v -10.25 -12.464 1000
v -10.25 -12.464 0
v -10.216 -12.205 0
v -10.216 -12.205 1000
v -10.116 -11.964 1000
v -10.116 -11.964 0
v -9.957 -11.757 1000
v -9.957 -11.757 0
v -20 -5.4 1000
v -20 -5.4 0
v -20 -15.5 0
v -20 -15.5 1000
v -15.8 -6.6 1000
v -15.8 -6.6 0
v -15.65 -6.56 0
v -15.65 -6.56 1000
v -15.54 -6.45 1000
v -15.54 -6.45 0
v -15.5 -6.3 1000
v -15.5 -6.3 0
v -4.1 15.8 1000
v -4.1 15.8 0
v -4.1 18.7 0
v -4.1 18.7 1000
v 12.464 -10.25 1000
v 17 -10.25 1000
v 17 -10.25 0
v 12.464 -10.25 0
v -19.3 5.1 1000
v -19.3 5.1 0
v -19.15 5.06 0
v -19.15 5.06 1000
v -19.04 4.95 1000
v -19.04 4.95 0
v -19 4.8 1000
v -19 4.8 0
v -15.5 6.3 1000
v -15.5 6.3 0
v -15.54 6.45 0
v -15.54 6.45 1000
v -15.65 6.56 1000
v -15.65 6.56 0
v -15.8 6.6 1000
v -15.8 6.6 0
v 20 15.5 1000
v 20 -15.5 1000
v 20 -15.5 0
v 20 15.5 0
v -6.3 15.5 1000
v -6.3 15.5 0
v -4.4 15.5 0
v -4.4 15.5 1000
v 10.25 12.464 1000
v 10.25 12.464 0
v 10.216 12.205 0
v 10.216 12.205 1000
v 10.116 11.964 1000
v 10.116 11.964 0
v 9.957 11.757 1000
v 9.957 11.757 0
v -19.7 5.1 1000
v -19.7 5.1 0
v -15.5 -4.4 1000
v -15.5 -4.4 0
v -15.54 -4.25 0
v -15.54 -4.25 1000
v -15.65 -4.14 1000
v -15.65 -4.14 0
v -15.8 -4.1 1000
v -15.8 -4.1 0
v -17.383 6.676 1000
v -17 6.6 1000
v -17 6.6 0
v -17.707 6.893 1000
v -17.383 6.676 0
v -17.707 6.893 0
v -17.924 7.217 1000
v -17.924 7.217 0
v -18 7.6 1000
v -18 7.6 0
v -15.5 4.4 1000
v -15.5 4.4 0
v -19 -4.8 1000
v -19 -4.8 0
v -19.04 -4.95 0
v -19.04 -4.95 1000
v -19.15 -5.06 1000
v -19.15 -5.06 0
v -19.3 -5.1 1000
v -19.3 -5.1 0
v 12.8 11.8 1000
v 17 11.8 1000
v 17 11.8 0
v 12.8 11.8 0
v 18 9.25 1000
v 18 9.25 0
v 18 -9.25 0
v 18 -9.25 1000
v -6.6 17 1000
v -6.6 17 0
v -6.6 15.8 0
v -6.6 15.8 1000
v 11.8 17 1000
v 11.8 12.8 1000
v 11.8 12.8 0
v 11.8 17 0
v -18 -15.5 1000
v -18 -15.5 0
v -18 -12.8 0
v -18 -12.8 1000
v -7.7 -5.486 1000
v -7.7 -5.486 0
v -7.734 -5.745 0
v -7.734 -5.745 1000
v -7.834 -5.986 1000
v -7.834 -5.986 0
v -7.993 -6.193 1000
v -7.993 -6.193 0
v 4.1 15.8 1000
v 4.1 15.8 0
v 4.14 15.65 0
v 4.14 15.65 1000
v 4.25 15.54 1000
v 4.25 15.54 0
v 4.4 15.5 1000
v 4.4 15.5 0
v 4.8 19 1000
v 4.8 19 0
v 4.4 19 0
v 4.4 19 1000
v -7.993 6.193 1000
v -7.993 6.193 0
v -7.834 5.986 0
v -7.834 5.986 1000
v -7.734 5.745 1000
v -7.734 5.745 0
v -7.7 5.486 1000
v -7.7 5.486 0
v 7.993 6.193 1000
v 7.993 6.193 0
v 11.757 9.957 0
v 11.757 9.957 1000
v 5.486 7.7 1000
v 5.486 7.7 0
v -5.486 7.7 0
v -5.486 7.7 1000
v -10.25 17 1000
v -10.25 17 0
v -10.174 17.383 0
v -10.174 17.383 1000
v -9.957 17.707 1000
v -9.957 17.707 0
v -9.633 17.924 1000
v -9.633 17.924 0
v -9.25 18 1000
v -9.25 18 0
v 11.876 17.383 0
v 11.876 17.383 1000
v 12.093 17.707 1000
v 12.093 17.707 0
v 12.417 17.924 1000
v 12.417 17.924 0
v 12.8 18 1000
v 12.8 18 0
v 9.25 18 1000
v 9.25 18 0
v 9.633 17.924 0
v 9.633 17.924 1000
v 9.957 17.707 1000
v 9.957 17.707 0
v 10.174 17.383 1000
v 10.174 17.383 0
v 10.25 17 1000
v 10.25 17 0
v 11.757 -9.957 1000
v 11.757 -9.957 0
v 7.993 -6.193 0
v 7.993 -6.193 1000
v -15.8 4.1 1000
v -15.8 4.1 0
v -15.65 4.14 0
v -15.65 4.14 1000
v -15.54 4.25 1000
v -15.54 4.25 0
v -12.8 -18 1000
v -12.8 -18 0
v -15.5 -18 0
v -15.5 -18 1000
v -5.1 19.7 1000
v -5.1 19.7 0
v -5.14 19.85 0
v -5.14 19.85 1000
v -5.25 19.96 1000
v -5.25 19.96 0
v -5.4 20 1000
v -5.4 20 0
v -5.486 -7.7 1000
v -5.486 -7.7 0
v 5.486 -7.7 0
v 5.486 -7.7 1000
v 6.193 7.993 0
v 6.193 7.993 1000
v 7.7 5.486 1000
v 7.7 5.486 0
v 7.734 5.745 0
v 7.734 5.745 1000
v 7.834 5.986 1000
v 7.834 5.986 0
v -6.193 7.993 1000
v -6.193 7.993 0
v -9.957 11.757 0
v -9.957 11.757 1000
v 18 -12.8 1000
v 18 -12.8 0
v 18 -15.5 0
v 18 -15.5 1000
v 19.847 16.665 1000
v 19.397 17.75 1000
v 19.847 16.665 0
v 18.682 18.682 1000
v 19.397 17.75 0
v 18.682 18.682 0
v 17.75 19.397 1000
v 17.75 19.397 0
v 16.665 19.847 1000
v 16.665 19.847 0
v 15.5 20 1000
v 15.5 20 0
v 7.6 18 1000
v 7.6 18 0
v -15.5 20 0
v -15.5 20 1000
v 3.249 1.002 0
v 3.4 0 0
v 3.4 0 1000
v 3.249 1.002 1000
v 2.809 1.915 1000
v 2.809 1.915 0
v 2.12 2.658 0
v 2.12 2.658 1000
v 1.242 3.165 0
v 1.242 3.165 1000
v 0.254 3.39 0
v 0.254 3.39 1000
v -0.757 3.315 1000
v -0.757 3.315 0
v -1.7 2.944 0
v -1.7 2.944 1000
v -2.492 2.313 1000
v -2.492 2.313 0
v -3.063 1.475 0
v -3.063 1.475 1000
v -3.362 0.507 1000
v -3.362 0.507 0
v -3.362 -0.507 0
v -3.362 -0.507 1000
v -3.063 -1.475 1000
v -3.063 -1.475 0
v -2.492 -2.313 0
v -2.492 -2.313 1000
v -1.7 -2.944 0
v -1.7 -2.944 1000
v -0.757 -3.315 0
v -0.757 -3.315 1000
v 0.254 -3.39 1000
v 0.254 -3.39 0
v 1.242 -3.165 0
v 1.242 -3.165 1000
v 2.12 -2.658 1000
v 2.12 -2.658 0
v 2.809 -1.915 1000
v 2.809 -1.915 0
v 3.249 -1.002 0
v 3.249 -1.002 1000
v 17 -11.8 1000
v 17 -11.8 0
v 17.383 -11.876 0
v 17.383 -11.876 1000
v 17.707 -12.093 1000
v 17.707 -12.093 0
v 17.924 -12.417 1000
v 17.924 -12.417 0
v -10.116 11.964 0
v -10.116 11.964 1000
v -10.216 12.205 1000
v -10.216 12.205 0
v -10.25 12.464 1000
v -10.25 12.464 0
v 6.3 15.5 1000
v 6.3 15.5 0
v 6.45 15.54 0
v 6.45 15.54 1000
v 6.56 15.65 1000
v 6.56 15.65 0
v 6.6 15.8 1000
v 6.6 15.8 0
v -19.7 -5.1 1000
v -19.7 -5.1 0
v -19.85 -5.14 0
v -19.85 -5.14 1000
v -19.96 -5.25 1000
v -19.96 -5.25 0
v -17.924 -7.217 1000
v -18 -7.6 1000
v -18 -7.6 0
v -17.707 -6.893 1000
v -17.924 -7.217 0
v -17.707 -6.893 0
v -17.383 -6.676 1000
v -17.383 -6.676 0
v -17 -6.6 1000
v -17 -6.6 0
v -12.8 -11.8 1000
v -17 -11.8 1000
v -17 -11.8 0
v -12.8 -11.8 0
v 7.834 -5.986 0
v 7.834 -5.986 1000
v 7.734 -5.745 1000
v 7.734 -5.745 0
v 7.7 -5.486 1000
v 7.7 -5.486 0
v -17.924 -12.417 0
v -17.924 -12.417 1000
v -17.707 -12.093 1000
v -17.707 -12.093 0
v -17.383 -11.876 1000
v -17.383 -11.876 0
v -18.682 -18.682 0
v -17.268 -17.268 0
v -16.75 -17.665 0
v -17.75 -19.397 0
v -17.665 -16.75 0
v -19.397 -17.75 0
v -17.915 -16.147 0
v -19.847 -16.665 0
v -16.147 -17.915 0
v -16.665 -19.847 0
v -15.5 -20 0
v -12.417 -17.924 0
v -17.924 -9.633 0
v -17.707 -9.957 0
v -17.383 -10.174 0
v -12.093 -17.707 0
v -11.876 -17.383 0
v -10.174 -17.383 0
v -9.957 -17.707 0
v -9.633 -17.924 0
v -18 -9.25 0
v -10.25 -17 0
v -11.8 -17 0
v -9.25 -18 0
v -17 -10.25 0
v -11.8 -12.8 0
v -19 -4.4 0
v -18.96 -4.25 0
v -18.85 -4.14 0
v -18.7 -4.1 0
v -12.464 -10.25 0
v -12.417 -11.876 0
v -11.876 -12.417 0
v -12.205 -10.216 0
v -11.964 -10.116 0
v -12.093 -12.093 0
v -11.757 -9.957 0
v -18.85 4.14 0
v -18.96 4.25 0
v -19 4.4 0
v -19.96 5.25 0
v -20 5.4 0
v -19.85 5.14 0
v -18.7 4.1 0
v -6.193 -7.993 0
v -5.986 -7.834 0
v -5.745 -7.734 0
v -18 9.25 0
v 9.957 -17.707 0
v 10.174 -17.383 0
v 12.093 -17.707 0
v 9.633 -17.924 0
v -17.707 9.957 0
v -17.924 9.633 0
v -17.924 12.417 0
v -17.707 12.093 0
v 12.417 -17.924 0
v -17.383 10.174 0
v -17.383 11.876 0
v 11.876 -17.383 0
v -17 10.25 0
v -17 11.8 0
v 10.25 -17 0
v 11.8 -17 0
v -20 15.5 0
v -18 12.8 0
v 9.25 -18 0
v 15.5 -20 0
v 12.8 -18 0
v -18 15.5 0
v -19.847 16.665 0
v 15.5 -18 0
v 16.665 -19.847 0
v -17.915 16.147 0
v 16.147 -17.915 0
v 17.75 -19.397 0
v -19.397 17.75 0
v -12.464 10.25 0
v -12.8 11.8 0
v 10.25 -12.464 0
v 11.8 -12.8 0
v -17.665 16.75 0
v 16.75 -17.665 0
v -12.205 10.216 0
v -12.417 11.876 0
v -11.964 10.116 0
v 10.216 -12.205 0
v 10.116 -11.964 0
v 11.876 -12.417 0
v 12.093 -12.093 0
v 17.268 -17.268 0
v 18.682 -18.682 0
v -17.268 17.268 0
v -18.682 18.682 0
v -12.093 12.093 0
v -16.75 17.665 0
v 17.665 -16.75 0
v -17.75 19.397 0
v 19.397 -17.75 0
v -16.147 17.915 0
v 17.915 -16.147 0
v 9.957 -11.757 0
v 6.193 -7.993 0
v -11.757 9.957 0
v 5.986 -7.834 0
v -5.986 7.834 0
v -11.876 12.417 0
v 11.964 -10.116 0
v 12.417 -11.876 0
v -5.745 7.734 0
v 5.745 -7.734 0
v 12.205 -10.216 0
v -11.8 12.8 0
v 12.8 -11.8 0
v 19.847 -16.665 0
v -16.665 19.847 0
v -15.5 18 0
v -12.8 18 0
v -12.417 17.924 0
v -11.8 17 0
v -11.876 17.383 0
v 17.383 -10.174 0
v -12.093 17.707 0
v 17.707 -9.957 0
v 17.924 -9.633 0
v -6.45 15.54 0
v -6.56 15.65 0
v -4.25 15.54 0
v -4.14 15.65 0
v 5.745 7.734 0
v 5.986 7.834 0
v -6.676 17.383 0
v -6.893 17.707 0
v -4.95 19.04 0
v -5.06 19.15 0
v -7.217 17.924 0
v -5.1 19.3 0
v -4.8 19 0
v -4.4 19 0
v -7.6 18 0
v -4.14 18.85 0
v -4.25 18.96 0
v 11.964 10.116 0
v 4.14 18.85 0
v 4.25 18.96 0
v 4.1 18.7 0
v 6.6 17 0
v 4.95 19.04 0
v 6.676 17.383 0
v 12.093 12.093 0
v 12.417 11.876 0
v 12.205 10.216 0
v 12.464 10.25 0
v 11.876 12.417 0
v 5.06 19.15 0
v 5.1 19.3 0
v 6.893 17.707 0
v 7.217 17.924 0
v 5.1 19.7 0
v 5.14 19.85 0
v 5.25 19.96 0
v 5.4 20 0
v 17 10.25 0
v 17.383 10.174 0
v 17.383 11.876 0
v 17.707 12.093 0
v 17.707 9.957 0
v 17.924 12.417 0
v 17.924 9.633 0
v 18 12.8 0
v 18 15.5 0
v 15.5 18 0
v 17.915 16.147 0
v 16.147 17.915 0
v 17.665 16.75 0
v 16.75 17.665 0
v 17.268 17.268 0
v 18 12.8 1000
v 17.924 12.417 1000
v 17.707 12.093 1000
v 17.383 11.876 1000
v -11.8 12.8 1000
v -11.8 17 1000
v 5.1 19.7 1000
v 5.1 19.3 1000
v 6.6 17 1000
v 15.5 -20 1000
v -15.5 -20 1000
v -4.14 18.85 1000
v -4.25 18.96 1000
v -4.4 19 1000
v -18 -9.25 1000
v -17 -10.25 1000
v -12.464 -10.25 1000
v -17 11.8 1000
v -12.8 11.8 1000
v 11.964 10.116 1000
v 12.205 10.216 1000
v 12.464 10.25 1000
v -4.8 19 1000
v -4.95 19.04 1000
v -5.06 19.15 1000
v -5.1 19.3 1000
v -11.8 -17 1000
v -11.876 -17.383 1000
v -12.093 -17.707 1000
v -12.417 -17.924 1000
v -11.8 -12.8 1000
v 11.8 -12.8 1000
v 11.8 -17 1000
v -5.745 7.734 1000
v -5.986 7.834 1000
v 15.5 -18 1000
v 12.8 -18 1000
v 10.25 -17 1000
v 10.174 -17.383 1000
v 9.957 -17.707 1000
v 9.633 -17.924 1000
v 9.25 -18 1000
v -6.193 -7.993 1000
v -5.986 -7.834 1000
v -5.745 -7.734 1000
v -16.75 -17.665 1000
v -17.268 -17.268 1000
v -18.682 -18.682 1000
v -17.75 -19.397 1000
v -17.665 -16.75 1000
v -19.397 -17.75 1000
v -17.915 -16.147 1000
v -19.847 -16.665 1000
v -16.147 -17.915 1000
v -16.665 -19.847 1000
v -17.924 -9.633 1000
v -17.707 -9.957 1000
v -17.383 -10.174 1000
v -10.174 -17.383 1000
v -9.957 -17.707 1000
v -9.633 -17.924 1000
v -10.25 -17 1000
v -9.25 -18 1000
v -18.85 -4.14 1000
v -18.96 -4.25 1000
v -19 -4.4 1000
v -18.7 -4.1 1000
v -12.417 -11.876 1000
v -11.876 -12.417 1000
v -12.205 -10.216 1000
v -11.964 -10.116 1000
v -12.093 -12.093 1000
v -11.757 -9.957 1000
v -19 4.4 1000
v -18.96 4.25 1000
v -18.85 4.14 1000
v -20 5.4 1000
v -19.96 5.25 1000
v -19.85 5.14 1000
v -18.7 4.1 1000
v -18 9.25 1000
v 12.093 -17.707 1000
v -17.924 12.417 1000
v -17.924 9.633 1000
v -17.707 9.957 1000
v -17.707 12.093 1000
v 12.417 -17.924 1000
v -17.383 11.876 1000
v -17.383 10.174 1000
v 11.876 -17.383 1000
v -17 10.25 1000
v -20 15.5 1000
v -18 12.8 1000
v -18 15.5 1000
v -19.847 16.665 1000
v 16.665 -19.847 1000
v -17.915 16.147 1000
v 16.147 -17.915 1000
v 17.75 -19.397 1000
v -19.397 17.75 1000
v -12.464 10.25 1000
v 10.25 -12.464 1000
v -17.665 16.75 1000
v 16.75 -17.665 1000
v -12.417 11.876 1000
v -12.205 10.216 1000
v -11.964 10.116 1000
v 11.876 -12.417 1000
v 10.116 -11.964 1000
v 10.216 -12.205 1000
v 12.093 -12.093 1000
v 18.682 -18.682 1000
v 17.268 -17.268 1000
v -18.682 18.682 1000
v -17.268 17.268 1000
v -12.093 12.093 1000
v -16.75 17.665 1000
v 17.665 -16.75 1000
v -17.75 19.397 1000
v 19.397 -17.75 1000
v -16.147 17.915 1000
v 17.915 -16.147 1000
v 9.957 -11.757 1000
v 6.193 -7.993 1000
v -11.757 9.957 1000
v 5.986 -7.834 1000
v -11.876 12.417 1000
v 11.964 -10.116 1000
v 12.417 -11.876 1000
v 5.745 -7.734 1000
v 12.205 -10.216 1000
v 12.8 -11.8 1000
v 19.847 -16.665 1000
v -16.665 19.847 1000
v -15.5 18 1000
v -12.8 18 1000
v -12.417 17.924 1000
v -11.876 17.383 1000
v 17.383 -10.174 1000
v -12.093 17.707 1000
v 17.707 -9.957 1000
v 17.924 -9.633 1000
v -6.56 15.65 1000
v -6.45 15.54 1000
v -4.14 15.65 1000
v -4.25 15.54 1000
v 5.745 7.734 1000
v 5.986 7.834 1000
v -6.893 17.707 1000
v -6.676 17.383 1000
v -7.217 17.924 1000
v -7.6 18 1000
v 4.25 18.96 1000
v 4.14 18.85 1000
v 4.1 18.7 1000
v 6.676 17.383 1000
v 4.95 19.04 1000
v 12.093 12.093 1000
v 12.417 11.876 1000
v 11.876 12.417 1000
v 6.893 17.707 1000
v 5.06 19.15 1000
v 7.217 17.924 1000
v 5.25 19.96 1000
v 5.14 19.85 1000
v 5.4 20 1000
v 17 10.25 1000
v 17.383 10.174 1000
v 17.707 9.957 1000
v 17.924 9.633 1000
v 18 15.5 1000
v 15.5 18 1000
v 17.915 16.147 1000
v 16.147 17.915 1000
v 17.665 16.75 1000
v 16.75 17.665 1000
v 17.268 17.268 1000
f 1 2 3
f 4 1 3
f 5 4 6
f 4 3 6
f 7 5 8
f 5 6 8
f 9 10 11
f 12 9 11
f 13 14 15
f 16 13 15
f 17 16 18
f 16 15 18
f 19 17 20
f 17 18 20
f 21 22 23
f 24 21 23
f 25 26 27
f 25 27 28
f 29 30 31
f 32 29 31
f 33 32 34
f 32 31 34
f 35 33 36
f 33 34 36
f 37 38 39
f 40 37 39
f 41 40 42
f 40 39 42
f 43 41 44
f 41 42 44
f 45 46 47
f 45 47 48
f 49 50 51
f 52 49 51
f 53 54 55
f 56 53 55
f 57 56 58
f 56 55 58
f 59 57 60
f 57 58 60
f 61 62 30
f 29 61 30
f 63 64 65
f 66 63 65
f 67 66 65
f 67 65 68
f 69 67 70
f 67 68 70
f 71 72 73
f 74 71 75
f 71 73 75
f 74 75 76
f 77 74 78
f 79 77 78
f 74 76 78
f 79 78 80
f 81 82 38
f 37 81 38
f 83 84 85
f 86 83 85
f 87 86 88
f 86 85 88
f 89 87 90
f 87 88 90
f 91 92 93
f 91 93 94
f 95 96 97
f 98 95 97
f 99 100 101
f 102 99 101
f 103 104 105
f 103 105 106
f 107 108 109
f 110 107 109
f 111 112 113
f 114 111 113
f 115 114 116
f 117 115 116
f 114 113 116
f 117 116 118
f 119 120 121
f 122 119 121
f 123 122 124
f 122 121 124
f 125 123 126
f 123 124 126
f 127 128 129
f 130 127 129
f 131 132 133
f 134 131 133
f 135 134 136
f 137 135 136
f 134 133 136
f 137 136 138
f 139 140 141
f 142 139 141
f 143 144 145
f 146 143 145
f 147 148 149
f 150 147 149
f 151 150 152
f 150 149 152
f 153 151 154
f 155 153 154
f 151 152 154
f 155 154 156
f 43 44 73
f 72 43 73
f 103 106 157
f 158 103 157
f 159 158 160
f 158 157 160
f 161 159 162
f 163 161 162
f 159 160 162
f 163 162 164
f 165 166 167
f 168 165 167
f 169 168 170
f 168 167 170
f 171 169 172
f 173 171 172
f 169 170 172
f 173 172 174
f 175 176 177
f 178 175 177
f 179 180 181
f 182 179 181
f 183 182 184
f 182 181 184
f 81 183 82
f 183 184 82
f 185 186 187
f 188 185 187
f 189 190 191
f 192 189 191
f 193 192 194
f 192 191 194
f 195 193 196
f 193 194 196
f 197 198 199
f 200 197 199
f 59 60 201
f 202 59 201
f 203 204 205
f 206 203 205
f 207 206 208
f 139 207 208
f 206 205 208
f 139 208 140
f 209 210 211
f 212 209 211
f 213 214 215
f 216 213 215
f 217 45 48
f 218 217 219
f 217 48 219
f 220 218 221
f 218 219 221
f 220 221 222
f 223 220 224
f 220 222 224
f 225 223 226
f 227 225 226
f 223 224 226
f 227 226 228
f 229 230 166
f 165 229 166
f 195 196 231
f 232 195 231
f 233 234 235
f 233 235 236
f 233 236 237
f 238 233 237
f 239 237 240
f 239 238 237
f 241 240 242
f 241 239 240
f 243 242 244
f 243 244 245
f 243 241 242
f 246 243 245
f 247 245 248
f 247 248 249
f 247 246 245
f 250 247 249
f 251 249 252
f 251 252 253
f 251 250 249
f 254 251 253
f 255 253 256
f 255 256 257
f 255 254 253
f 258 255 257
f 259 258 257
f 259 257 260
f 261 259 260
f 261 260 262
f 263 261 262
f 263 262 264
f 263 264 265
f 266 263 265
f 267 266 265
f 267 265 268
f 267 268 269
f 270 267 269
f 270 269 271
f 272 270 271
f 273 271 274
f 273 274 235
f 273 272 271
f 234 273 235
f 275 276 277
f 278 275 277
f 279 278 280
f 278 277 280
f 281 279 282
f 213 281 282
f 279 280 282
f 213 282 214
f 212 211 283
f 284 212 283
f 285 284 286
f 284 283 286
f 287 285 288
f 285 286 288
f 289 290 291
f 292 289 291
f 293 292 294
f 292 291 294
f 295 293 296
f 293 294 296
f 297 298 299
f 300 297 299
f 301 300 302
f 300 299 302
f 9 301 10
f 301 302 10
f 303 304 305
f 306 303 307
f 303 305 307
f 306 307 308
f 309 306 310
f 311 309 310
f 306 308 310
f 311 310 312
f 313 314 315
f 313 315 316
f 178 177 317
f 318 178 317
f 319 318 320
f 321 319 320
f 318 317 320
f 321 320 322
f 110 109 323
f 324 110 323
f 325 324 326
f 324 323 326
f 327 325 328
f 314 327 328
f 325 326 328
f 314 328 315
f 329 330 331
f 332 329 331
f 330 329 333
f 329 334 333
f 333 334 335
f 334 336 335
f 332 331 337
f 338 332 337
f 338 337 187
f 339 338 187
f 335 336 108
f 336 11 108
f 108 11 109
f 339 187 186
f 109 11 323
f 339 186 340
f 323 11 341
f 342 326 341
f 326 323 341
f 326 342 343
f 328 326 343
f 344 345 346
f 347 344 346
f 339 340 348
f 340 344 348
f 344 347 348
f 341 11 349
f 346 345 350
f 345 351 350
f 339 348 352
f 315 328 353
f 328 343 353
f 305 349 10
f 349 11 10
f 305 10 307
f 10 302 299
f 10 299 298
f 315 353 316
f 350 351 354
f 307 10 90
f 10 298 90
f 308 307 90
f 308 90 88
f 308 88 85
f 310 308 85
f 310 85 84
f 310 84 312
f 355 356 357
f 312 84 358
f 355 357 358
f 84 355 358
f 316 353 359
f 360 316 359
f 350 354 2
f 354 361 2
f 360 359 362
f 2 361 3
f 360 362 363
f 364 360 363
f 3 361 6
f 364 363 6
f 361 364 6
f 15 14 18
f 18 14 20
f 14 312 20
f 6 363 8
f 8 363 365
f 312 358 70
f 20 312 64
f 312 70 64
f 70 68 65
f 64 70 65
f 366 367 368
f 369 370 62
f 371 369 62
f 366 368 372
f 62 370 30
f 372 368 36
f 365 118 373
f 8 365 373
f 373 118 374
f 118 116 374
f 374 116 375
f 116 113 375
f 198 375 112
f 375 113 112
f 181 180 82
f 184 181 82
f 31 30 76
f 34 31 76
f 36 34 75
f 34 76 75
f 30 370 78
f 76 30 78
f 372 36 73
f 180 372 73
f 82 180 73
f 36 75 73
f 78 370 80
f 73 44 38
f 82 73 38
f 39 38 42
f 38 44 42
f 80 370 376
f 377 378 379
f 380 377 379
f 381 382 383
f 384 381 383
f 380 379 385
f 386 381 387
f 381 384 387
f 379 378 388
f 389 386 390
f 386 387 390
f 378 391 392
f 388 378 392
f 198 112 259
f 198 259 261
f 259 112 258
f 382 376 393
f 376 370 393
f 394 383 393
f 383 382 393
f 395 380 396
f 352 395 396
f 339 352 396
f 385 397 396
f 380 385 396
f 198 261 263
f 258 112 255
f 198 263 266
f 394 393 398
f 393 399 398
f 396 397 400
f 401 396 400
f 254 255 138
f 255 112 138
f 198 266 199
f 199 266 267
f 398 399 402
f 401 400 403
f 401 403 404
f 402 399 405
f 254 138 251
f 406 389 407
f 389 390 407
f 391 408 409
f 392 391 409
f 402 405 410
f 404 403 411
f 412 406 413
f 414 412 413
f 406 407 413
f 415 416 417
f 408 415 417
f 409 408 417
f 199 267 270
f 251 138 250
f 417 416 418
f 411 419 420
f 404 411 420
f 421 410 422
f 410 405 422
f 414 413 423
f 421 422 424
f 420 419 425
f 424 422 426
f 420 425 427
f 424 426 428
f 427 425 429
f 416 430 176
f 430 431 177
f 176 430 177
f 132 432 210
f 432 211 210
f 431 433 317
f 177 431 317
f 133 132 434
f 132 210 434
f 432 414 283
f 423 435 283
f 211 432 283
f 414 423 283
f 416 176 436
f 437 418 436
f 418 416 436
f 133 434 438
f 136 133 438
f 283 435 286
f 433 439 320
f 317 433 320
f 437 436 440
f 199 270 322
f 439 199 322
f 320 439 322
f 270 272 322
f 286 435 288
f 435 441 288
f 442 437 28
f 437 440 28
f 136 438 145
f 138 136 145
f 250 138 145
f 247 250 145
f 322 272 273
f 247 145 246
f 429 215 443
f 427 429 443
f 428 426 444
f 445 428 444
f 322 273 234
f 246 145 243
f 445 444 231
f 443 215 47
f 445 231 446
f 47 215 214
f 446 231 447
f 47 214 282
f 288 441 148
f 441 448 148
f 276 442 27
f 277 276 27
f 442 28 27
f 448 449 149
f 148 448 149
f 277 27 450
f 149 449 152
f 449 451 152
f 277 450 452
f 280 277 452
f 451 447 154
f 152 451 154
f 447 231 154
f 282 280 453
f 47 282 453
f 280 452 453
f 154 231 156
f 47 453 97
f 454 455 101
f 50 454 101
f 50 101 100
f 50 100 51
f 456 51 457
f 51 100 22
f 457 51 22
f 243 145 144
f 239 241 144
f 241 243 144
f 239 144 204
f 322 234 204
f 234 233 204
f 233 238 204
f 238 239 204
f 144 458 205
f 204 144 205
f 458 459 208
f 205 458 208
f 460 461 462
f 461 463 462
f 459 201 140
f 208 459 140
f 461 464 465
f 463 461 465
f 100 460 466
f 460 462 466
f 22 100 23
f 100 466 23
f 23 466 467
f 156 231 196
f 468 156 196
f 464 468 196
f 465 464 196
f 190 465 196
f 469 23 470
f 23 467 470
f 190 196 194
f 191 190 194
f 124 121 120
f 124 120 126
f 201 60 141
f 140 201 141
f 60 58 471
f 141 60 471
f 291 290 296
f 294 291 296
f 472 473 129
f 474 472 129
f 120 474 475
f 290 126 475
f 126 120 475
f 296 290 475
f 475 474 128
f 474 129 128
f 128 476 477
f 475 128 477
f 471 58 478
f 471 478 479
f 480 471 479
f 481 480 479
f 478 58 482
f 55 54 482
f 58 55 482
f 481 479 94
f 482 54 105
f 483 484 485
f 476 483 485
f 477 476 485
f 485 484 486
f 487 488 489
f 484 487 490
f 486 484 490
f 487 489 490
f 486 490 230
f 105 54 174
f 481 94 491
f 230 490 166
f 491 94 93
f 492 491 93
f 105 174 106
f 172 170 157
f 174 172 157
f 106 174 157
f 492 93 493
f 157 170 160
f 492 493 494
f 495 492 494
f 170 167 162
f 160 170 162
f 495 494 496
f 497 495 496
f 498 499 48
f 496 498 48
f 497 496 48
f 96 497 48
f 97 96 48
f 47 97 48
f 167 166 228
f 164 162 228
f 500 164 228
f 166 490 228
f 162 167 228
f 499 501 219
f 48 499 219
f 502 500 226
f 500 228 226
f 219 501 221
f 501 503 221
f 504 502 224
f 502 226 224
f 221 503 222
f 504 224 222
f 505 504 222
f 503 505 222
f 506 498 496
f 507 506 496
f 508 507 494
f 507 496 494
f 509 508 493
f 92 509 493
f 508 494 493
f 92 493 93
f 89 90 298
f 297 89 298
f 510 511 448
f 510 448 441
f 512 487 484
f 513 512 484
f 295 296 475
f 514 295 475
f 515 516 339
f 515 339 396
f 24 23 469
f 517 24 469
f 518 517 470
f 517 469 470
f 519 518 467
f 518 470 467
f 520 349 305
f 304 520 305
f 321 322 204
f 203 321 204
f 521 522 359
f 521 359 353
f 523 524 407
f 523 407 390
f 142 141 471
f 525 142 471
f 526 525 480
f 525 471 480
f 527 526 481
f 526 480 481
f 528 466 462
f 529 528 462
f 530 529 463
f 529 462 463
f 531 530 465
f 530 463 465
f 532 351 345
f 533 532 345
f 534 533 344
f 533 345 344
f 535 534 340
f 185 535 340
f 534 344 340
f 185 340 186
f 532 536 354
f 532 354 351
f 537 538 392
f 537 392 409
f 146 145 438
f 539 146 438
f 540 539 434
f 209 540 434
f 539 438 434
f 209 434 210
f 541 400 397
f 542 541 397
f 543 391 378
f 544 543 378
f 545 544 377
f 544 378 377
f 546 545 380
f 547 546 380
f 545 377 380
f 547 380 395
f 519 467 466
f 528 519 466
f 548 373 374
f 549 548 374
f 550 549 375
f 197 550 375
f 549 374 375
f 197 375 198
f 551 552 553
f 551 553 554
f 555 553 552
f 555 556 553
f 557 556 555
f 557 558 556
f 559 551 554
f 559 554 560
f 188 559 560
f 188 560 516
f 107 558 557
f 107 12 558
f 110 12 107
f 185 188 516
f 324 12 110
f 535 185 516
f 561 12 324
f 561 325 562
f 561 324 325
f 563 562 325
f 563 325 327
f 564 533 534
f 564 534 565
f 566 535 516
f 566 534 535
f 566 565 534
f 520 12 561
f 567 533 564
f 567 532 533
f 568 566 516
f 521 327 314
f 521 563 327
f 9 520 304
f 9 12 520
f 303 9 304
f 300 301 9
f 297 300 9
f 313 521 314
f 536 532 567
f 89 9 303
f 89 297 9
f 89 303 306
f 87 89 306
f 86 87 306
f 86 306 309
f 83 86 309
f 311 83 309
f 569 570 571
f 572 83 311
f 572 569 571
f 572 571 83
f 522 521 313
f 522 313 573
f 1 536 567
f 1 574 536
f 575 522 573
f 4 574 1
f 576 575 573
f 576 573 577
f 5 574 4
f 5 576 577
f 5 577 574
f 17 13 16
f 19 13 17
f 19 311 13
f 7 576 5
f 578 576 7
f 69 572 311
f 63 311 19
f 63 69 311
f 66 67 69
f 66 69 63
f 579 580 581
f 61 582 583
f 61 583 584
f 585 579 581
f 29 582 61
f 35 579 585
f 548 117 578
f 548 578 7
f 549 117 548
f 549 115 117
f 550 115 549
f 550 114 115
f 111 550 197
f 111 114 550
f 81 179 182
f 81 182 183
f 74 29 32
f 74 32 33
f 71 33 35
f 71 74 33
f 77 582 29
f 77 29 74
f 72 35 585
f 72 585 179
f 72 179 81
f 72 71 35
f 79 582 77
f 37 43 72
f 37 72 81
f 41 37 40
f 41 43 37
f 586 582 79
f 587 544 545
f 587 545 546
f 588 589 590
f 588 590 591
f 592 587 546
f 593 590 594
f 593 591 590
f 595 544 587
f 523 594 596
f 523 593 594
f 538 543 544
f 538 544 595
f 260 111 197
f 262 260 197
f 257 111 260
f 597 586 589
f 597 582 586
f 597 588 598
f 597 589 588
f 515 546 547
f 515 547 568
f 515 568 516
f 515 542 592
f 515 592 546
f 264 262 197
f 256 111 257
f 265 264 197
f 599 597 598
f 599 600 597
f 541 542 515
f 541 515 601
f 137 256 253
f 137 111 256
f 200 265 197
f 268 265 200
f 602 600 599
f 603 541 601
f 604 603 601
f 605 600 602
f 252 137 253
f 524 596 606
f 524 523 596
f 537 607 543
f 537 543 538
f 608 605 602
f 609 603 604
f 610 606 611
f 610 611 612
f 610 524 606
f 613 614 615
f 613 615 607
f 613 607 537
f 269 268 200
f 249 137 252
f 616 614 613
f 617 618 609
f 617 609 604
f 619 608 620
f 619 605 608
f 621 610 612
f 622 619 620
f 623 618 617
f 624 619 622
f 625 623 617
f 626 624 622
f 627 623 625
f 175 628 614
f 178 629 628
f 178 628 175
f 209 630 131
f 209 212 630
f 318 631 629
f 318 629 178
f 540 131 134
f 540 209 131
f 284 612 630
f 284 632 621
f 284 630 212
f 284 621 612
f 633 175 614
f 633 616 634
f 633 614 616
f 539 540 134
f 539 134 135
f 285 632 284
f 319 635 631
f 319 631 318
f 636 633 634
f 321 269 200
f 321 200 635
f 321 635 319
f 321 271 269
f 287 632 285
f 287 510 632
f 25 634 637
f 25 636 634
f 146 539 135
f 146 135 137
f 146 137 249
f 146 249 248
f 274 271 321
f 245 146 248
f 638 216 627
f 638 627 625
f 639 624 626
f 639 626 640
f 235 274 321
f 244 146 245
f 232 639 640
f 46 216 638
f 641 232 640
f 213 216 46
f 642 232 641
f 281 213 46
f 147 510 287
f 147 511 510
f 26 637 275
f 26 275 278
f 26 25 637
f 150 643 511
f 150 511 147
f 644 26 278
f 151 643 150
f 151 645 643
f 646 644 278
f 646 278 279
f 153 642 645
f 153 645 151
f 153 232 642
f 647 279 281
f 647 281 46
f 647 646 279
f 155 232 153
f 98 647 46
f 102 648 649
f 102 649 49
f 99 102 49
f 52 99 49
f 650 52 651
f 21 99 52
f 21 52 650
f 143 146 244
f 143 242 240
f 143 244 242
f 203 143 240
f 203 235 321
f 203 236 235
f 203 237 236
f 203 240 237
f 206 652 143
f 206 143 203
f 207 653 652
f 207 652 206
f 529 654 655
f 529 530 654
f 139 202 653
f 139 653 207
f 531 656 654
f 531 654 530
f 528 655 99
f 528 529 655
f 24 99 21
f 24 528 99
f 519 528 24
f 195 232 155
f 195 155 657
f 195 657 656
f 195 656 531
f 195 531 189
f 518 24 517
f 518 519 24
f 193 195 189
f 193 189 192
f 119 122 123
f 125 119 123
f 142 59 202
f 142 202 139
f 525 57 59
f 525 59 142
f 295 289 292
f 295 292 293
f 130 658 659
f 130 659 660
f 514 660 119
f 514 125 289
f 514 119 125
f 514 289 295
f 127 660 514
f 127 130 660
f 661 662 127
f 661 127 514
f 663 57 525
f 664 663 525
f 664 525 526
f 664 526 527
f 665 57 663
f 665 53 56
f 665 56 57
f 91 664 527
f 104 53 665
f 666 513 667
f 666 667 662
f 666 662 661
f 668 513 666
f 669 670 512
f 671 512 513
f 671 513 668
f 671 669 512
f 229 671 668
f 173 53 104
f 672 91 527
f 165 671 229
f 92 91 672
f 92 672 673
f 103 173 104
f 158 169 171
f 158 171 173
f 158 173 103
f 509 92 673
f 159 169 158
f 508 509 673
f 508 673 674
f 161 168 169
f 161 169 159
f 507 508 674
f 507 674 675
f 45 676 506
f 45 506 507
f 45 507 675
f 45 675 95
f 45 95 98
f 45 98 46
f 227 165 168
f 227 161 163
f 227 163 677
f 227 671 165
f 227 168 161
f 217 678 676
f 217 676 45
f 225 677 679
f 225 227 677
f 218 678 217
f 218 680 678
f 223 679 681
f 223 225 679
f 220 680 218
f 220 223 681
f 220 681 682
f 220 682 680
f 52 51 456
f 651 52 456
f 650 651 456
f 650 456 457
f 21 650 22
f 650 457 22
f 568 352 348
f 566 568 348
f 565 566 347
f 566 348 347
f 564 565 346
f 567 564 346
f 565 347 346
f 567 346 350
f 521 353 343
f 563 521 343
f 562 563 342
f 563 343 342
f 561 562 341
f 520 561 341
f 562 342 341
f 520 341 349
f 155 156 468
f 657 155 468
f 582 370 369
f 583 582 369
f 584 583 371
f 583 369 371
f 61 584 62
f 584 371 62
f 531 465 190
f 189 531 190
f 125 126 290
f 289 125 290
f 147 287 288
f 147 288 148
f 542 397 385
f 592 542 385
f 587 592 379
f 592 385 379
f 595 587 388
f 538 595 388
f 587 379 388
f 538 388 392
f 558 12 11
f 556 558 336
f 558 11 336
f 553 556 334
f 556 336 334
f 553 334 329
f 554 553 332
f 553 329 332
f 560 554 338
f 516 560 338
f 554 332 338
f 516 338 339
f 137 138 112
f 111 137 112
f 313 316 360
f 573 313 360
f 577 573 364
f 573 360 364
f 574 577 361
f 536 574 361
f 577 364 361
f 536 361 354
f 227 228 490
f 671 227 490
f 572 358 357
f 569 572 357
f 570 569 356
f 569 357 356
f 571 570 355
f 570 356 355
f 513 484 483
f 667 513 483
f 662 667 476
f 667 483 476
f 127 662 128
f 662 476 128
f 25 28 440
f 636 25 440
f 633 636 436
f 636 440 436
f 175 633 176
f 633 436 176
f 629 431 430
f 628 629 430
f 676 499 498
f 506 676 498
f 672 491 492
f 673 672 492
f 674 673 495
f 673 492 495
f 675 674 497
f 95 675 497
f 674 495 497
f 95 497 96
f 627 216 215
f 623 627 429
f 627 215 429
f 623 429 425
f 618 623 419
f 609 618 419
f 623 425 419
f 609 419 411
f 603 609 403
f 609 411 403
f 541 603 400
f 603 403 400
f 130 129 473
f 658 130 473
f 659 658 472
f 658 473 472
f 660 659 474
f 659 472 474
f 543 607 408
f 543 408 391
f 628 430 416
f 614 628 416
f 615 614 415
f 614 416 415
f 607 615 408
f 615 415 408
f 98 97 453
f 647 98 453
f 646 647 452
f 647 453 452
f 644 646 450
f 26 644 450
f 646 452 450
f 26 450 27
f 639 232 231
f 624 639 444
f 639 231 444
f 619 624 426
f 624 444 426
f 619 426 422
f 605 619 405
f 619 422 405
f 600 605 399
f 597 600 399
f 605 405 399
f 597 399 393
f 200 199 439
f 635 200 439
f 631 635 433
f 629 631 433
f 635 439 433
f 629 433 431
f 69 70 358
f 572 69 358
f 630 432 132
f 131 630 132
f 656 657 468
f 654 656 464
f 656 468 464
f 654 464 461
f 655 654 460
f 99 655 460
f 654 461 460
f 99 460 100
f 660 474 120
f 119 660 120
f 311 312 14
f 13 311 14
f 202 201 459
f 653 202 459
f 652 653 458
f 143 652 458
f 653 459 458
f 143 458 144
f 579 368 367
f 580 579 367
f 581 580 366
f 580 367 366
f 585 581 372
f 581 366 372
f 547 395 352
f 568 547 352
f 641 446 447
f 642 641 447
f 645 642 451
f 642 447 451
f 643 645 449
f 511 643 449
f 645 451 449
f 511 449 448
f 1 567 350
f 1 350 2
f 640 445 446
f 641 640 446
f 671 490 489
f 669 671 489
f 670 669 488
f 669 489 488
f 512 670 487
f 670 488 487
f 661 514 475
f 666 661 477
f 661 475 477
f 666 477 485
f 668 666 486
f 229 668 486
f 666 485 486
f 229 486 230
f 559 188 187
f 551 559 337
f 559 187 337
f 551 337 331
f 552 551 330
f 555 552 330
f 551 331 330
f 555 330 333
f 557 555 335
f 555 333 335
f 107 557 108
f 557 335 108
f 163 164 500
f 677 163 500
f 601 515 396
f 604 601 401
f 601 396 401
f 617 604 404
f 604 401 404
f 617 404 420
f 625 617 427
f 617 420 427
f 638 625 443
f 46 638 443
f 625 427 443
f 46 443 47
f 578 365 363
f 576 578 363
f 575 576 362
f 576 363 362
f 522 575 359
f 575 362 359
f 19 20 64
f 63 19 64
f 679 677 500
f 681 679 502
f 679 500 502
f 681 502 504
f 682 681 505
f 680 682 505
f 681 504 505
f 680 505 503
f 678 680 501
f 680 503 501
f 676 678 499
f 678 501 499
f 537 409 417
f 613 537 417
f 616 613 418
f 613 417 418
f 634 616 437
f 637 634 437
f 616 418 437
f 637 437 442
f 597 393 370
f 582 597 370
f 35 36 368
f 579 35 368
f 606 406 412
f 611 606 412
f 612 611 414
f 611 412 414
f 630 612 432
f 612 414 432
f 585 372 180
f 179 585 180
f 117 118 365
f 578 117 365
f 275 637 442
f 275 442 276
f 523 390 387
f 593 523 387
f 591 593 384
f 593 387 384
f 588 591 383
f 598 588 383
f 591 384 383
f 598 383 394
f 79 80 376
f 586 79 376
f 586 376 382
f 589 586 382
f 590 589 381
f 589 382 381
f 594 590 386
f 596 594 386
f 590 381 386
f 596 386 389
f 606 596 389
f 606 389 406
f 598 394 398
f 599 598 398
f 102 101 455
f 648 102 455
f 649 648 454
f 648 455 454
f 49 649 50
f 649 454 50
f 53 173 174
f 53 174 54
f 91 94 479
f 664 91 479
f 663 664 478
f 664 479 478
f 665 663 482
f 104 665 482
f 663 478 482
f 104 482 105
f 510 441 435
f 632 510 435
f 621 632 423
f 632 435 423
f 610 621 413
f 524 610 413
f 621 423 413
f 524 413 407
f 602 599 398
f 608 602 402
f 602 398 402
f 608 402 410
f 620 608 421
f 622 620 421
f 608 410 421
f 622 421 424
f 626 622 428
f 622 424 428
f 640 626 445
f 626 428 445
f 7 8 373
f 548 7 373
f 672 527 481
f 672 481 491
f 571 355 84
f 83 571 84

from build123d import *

# Parameters (mm, degrees)
SKETCH_1_R      = 3.4
EXTRUDE_1_DEPTH = 1000


with BuildPart() as part:
    # Эскиз1 → Бобышка-Вытянуть1 (new body)
    with BuildSketch(Plane.XY):
        with BuildLine():
            Line((-20, 15.5), (-20, 10.25))
            Line((-20, 10.25), (-20, 5.4))
            ThreePointArc((-20, 5.4), (-19.912132034, 5.187867966), (-19.7, 5.1))
            Line((-19.7, 5.1), (-19.3, 5.1))
            ThreePointArc((-19.3, 5.1), (-19.087867966, 5.012132034), (-19, 4.8))
            Line((-19, 4.8), (-19, 4.4))
            ThreePointArc((-19, 4.4), (-18.912132034, 4.187867966), (-18.7, 4.1))
            Line((-18.7, 4.1), (-15.8, 4.1))
            ThreePointArc((-15.8, 4.1), (-15.587867966, 4.187867966), (-15.5, 4.4))
            Line((-15.5, 4.4), (-15.5, 6.3))
            ThreePointArc((-15.5, 6.3), (-15.587867966, 6.512132034), (-15.8, 6.6))
            Line((-15.8, 6.6), (-17, 6.6))
            ThreePointArc((-17, 6.6), (-17.707106781, 6.892893219), (-18, 7.6))
            Line((-18, 7.6), (-18, 9.25))
            ThreePointArc((-18, 9.25), (-17.707106781, 9.957106781), (-17, 10.25))
            Line((-17, 10.25), (-12.464213562, 10.25))
            ThreePointArc((-12.464213562, 10.25), (-12.08153013, 10.173879533), (-11.757106781, 9.957106781))
            Line((-11.757106781, 9.957106781), (-7.992893219, 6.192893219))
            ThreePointArc((-7.992893219, 6.192893219), (-7.776120467, 5.86846987), (-7.7, 5.485786438))
            Line((-7.7, 5.485786438), (-7.7, -5.485786438))
            ThreePointArc((-7.7, -5.485786438), (-7.776120467, -5.86846987), (-7.992893219, -6.192893219))
            Line((-7.992893219, -6.192893219), (-11.757106781, -9.957106781))
            ThreePointArc((-11.757106781, -9.957106781), (-12.08153013, -10.173879533), (-12.464213562, -10.25))
            Line((-12.464213562, -10.25), (-17, -10.25))
            ThreePointArc((-17, -10.25), (-17.707106781, -9.957106781), (-18, -9.25))
            Line((-18, -9.25), (-18, -7.6))
            ThreePointArc((-18, -7.6), (-17.707106781, -6.892893219), (-17, -6.6))
            Line((-17, -6.6), (-15.8, -6.6))
            ThreePointArc((-15.8, -6.6), (-15.587867966, -6.512132034), (-15.5, -6.3))
            Line((-15.5, -6.3), (-15.5, -4.4))
            ThreePointArc((-15.5, -4.4), (-15.587867966, -4.187867966), (-15.8, -4.1))
            Line((-15.8, -4.1), (-18.7, -4.1))
            ThreePointArc((-18.7, -4.1), (-18.912132034, -4.187867966), (-19, -4.4))
            Line((-19, -4.4), (-19, -4.8))
            ThreePointArc((-19, -4.8), (-19.087867966, -5.012132034), (-19.3, -5.1))
            Line((-19.3, -5.1), (-19.7, -5.1))
            ThreePointArc((-19.7, -5.1), (-19.912132034, -5.187867966), (-20, -5.4))
            Line((-20, -5.4), (-20, -10.25))
            Line((-20, -10.25), (-20, -15.5))
            ThreePointArc((-20, -15.5), (-18.681980515, -18.681980515), (-15.5, -20))
            Line((-15.5, -20), (-10.25, -20))
            Line((-10.25, -20), (0, -20))
            Line((0, -20), (10.25, -20))
            Line((10.25, -20), (15.5, -20))
            ThreePointArc((15.5, -20), (18.681980515, -18.681980515), (20, -15.5))
            Line((20, -15.5), (20, -10.25))
            Line((20, -10.25), (20, 0))
            Line((20, 0), (20, 10.25))
            Line((20, 10.25), (20, 15.5))
            ThreePointArc((20, 15.5), (18.681980515, 18.681980515), (15.5, 20))
            Line((15.5, 20), (10.25, 20))
            Line((10.25, 20), (5.4, 20))
            ThreePointArc((5.4, 20), (5.187867966, 19.912132034), (5.1, 19.7))
            Line((5.1, 19.7), (5.1, 19.3))
            ThreePointArc((5.1, 19.3), (5.012132034, 19.087867966), (4.8, 19))
            Line((4.8, 19), (4.4, 19))
            ThreePointArc((4.4, 19), (4.187867966, 18.912132034), (4.1, 18.7))
            Line((4.1, 18.7), (4.1, 15.8))
            ThreePointArc((4.1, 15.8), (4.187867966, 15.587867966), (4.4, 15.5))
            Line((4.4, 15.5), (6.3, 15.5))
            ThreePointArc((6.3, 15.5), (6.512132034, 15.587867966), (6.6, 15.8))
            Line((6.6, 15.8), (6.6, 17))
            ThreePointArc((6.6, 17), (6.892893219, 17.707106781), (7.6, 18))
            Line((7.6, 18), (9.25, 18))
            ThreePointArc((9.25, 18), (9.957106781, 17.707106781), (10.25, 17))
            Line((10.25, 17), (10.25, 12.464213562))
            ThreePointArc((10.25, 12.464213562), (10.173879533, 12.08153013), (9.957106781, 11.757106781))
            Line((9.957106781, 11.757106781), (6.192893219, 7.992893219))
            ThreePointArc((6.192893219, 7.992893219), (5.86846987, 7.776120467), (5.485786438, 7.7))
            Line((5.485786438, 7.7), (-5.485786438, 7.7))
            ThreePointArc((-5.485786438, 7.7), (-5.86846987, 7.776120467), (-6.192893219, 7.992893219))
            Line((-6.192893219, 7.992893219), (-9.957106781, 11.757106781))
            ThreePointArc((-9.957106781, 11.757106781), (-10.173879533, 12.08153013), (-10.25, 12.464213562))
            Line((-10.25, 12.464213562), (-10.25, 17))
            ThreePointArc((-10.25, 17), (-9.957106781, 17.707106781), (-9.25, 18))
            Line((-9.25, 18), (-7.6, 18))
            ThreePointArc((-7.6, 18), (-6.892893219, 17.707106781), (-6.6, 17))
            Line((-6.6, 17), (-6.6, 15.8))
            ThreePointArc((-6.6, 15.8), (-6.512132034, 15.587867966), (-6.3, 15.5))
            Line((-6.3, 15.5), (-4.4, 15.5))
            ThreePointArc((-4.4, 15.5), (-4.187867966, 15.587867966), (-4.1, 15.8))
            Line((-4.1, 15.8), (-4.1, 18.7))
            ThreePointArc((-4.1, 18.7), (-4.187867966, 18.912132034), (-4.4, 19))
            Line((-4.4, 19), (-4.8, 19))
            ThreePointArc((-4.8, 19), (-5.012132034, 19.087867966), (-5.1, 19.3))
            Line((-5.1, 19.3), (-5.1, 19.7))
            ThreePointArc((-5.1, 19.7), (-5.187867966, 19.912132034), (-5.4, 20))
            Line((-5.4, 20), (-10.25, 20))
            Line((-10.25, 20), (-15.5, 20))
            ThreePointArc((-15.5, 20), (-18.681980515, 18.681980515), (-20, 15.5))
        make_face()
        with BuildLine():
            ThreePointArc((-12.8, -11.8), (-12.092893219, -12.092893219), (-11.8, -12.8))
            Line((-11.8, -12.8), (-11.8, -17))
            ThreePointArc((-11.8, -17), (-12.092893219, -17.707106781), (-12.8, -18))
            Line((-12.8, -18), (-15.5, -18))
            ThreePointArc((-15.5, -18), (-17.267766953, -17.267766953), (-18, -15.5))
            Line((-18, -15.5), (-18, -12.8))
            ThreePointArc((-18, -12.8), (-17.707106781, -12.092893219), (-17, -11.8))
            Line((-17, -11.8), (-12.8, -11.8))
        make_face(mode=Mode.SUBTRACT)
        with BuildLine():
            Line((9.25, -18), (0, -18))
            Line((0, -18), (-9.25, -18))
            ThreePointArc((-9.25, -18), (-9.957106781, -17.707106781), (-10.25, -17))
            Line((-10.25, -17), (-10.25, -12.464213562))
            ThreePointArc((-10.25, -12.464213562), (-10.173879533, -12.08153013), (-9.957106781, -11.757106781))
            Line((-9.957106781, -11.757106781), (-6.192893219, -7.992893219))
            ThreePointArc((-6.192893219, -7.992893219), (-5.86846987, -7.776120467), (-5.485786438, -7.7))
            Line((-5.485786438, -7.7), (5.485786438, -7.7))
            ThreePointArc((5.485786438, -7.7), (5.86846987, -7.776120467), (6.192893219, -7.992893219))
            Line((6.192893219, -7.992893219), (9.957106781, -11.757106781))
            ThreePointArc((9.957106781, -11.757106781), (10.173879533, -12.08153013), (10.25, -12.464213562))
            Line((10.25, -12.464213562), (10.25, -17))
            ThreePointArc((10.25, -17), (9.957106781, -17.707106781), (9.25, -18))
        make_face(mode=Mode.SUBTRACT)
        with BuildLine():
            ThreePointArc((11.8, -12.8), (12.092893219, -12.092893219), (12.8, -11.8))
            Line((12.8, -11.8), (17, -11.8))
            ThreePointArc((17, -11.8), (17.707106781, -12.092893219), (18, -12.8))
            Line((18, -12.8), (18, -15.5))
            ThreePointArc((18, -15.5), (17.267766953, -17.267766953), (15.5, -18))
            Line((15.5, -18), (12.8, -18))
            ThreePointArc((12.8, -18), (12.092893219, -17.707106781), (11.8, -17))
            Line((11.8, -17), (11.8, -12.8))
        make_face(mode=Mode.SUBTRACT)
        Circle(SKETCH_1_R, mode=Mode.SUBTRACT)
        with BuildLine():
            ThreePointArc((-11.8, 12.8), (-12.092893219, 12.092893219), (-12.8, 11.8))
            Line((-12.8, 11.8), (-17, 11.8))
            ThreePointArc((-17, 11.8), (-17.707106781, 12.092893219), (-18, 12.8))
            Line((-18, 12.8), (-18, 15.5))
            ThreePointArc((-18, 15.5), (-17.267766953, 17.267766953), (-15.5, 18))
            Line((-15.5, 18), (-12.8, 18))
            ThreePointArc((-12.8, 18), (-12.092893219, 17.707106781), (-11.8, 17))
            Line((-11.8, 17), (-11.8, 12.8))
        make_face(mode=Mode.SUBTRACT)
        with BuildLine():
            Line((18, 9.25), (18, 0))
            Line((18, 0), (18, -9.25))
            ThreePointArc((18, -9.25), (17.707106781, -9.957106781), (17, -10.25))
            Line((17, -10.25), (12.464213562, -10.25))
            ThreePointArc((12.464213562, -10.25), (12.08153013, -10.173879533), (11.757106781, -9.957106781))
            Line((11.757106781, -9.957106781), (7.992893219, -6.192893219))
            ThreePointArc((7.992893219, -6.192893219), (7.776120467, -5.86846987), (7.7, -5.485786438))
            Line((7.7, -5.485786438), (7.7, 5.485786438))
            ThreePointArc((7.7, 5.485786438), (7.776120467, 5.86846987), (7.992893219, 6.192893219))
            Line((7.992893219, 6.192893219), (11.757106781, 9.957106781))
            ThreePointArc((11.757106781, 9.957106781), (12.08153013, 10.173879533), (12.464213562, 10.25))
            Line((12.464213562, 10.25), (17, 10.25))
            ThreePointArc((17, 10.25), (17.707106781, 9.957106781), (18, 9.25))
        make_face(mode=Mode.SUBTRACT)
        with BuildLine():
            ThreePointArc((12.8, 11.8), (12.092893219, 12.092893219), (11.8, 12.8))
            Line((11.8, 12.8), (11.8, 17))
            ThreePointArc((11.8, 17), (12.092893219, 17.707106781), (12.8, 18))
            Line((12.8, 18), (15.5, 18))
            ThreePointArc((15.5, 18), (17.267766953, 17.267766953), (18, 15.5))
            Line((18, 15.5), (18, 12.8))
            ThreePointArc((18, 12.8), (17.707106781, 12.092893219), (17, 11.8))
            Line((17, 11.8), (12.8, 11.8))
        make_face(mode=Mode.SUBTRACT)
    extrude(amount=EXTRUDE_1_DEPTH)


solid = part.part
